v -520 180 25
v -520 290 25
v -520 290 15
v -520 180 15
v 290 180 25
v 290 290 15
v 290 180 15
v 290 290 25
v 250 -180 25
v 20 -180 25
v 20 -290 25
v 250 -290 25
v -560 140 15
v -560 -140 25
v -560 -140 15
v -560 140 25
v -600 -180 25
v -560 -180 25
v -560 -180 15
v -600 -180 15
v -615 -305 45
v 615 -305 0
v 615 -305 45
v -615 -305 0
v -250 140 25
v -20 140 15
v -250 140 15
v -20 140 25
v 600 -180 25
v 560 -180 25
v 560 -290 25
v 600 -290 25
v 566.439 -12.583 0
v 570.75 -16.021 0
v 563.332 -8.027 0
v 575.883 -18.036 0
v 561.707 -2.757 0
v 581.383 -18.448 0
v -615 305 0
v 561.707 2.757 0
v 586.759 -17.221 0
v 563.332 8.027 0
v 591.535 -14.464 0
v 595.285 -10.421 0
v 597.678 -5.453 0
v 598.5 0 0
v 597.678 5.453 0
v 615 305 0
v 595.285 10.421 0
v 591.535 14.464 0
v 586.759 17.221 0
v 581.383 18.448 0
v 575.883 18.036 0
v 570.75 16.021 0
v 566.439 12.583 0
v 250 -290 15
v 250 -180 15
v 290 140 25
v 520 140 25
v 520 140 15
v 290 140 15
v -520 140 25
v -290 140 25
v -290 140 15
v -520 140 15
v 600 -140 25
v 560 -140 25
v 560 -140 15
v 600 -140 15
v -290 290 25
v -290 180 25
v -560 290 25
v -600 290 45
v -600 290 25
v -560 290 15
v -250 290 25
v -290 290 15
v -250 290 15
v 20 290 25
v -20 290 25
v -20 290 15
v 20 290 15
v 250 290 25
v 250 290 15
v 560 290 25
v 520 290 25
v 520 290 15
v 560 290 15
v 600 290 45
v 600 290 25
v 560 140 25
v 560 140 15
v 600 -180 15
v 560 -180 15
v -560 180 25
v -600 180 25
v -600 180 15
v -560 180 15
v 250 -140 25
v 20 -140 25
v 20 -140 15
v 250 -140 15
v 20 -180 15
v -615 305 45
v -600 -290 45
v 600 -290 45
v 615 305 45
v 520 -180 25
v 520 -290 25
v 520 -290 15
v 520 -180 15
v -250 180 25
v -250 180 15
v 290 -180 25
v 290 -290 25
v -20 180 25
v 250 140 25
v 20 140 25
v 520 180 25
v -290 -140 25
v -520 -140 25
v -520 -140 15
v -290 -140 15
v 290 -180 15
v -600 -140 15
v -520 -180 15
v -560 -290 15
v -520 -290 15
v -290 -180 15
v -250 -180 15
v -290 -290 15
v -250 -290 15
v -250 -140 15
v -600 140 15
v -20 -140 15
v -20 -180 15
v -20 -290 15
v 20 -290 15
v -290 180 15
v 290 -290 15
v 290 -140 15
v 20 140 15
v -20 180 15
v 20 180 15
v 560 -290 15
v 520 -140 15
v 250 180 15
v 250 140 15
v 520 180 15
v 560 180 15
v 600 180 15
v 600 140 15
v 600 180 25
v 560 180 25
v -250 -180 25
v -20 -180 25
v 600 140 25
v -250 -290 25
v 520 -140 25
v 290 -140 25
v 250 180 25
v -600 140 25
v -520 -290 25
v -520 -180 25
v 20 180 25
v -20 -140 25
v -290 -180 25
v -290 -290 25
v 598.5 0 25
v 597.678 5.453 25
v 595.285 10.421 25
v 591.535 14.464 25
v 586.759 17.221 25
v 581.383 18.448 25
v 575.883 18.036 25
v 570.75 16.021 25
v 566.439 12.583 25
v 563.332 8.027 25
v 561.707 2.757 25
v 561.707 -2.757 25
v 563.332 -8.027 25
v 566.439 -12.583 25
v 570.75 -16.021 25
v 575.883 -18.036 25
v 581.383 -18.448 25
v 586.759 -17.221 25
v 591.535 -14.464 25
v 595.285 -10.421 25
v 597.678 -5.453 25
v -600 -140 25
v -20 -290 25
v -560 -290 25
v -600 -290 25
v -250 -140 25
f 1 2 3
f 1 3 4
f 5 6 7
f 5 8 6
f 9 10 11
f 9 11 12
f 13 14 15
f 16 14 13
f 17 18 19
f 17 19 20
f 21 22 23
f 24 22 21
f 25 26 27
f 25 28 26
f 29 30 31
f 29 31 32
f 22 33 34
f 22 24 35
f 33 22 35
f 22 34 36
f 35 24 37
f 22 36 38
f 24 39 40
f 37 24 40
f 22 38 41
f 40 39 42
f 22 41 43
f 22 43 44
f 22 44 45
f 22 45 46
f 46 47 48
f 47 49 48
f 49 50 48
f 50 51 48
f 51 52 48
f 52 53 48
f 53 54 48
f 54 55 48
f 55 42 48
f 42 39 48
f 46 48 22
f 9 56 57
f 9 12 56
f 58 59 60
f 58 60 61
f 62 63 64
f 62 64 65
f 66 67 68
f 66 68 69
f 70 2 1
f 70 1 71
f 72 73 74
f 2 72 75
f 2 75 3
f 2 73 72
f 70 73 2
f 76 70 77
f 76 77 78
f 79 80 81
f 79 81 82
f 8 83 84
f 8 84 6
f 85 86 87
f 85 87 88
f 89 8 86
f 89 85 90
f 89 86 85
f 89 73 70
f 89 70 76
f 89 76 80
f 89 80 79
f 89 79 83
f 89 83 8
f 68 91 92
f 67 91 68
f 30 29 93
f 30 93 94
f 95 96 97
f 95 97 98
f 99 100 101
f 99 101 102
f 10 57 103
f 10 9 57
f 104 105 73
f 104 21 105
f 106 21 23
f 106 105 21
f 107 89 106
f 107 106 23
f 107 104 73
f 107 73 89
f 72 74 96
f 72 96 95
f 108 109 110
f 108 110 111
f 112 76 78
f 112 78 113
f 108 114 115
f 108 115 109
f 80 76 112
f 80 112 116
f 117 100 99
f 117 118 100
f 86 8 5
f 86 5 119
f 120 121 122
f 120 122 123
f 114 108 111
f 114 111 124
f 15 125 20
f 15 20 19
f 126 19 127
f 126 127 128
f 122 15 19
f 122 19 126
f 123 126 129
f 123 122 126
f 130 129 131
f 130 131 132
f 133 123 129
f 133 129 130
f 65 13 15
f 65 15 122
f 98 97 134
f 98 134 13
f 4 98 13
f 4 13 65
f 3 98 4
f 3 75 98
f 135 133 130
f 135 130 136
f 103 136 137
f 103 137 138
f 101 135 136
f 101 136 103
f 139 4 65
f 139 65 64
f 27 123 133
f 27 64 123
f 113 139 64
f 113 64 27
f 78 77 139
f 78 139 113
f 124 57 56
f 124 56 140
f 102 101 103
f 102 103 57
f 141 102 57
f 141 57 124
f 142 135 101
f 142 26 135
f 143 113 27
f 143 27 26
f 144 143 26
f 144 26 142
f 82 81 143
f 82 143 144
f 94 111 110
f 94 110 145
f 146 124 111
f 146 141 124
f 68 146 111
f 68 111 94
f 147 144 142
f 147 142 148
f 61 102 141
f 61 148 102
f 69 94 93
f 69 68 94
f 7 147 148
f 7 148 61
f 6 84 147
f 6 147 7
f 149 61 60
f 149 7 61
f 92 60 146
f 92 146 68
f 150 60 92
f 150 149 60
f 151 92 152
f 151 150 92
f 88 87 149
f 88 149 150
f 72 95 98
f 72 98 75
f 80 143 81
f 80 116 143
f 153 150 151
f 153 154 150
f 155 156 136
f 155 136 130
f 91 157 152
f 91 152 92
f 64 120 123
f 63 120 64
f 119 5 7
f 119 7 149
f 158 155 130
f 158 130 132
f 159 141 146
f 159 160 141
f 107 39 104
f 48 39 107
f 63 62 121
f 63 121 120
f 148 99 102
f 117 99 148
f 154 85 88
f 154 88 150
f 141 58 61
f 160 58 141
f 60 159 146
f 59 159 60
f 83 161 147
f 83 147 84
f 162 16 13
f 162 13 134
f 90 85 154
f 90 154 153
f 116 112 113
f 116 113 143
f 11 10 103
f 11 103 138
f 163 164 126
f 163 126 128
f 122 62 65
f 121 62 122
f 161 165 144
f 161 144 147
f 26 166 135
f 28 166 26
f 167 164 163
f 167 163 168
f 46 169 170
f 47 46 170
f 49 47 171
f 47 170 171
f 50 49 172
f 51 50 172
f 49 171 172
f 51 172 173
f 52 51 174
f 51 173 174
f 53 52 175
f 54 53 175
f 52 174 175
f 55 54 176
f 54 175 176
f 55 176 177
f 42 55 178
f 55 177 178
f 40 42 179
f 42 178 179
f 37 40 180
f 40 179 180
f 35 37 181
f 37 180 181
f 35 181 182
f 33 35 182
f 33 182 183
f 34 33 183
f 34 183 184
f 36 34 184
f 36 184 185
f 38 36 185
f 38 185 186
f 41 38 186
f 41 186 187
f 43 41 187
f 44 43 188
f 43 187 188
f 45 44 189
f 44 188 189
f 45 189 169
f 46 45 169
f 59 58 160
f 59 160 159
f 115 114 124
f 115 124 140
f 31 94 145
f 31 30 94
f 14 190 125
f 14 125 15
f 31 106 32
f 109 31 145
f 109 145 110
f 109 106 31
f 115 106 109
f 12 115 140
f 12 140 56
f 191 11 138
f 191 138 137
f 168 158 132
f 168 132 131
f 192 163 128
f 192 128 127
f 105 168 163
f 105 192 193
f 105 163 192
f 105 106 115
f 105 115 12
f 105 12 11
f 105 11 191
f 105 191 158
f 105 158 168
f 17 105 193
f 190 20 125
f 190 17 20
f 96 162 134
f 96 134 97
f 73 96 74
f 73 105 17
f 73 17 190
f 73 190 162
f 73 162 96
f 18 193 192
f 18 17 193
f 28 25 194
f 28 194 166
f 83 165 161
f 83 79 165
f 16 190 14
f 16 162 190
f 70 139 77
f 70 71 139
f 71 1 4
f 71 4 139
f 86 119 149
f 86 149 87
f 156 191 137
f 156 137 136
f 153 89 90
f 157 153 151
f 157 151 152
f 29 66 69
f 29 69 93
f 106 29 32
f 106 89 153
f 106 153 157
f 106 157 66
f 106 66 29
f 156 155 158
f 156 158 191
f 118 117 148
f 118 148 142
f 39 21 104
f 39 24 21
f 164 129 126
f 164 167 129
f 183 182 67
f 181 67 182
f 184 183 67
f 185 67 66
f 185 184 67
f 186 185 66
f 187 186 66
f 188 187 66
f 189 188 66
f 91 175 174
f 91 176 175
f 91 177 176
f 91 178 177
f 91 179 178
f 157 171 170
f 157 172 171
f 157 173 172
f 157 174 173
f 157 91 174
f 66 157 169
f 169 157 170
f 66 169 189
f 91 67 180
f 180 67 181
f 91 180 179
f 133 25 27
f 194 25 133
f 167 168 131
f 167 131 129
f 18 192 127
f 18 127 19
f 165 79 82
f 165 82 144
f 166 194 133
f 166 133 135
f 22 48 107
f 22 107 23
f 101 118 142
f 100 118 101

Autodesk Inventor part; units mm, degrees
ref_plane "YZ Plane" through (0, 0, 0) normal (1, 0, 0) x (0, 1, 0)
ref_plane "XZ Plane" through (0, 0, 0) normal (0, 1, 0) x (-1, 0, 0)
ref_plane "XY Plane" through (0, 0, 0) normal (0, 0, 1) x (1, 0, 0)
sketch "Sketch1" plane through (0, 0, 0) normal (0, 0, 1) x (1, 0, 0)
  line L0 (-615, 305) -> (615, 305)
  line L1 (615, 305) -> (615, -305)
  line L2 (615, -305) -> (-615, -305)
  line L3 (-615, -305) -> (-615, 305)
  line L4 (-615, 305) -> (615, -305) construction
  line L5 (615, 305) -> (-615, -305) construction
  point P0 (0, 0)
  dimension "d0" = 610
  dimension "d1" = 1230
extrude "Extrusion1" add sketch "Sketch1" along normal blind 45
sketch "Sketch2" plane through (0, 0, 45) normal (0, 0, 1) x (1, 0, 0)
  line L0 (-600, 290) -> (600, 290)
  line L1 (600, 290) -> (600, -290)
  line L2 (600, -290) -> (-600, -290)
  line L3 (-600, -290) -> (-600, 290)
  line L4 (-600, 290) -> (600, -290) construction
  line L5 (600, 290) -> (-600, -290) construction
  point P0 (0, 0)
  dimension "d4" = 1200
  dimension "d5" = 580
extrude "Extrusion2" cut sketch "Sketch2" against normal blind 20
sketch "Sketch3" plane through (0, 0, 25) normal (0, 0, 1) x (1, 0, 0)
  line L0 (-20, 290) -> (20, 290)
  line L1 (20, 290) -> (20, -290)
  line L2 (20, -290) -> (-20, -290)
  line L3 (-20, -290) -> (-20, 290)
  line L4 (-20, 290) -> (20, -290) construction
  line L5 (20, 290) -> (-20, -290) construction
  line L6 (250, 290) -> (290, 290)
  line L7 (290, 290) -> (290, -290)
  line L8 (290, -290) -> (250, -290)
  line L9 (250, -290) -> (250, 290)
  line L10 (-290, 290) -> (-250, 290)
  line L11 (-250, 290) -> (-250, -290)
  line L12 (-250, -290) -> (-290, -290)
  line L13 (-290, -290) -> (-290, 290)
  line L14 (-600, 290) -> (600, 290) projected
  line L15 (520, 290) -> (560, 290)
  line L16 (560, 290) -> (560, -290)
  line L17 (560, -290) -> (520, -290)
  line L18 (520, -290) -> (520, 290)
  line L19 (-560, 290) -> (-520, 290)
  line L20 (-520, 290) -> (-520, -290)
  line L21 (-520, -290) -> (-560, -290)
  line L22 (-560, -290) -> (-560, 290)
  point P0 (0, 0)
  point P1 (250, 0)
  point P2 (-250, 0)
  point P3 (520, 0)
  point P4 (290, 0)
  point P5 (-290, 0)
  point P6 (-520, 0)
  dimension "d8" = 580
  dimension "d9" = 40
  dimension "d10" = 250
  dimension "d11" = 40
  dimension "d12" = 40
  dimension "d13" = 250
  dimension "d14" = 40
  dimension "d15" = 230
  dimension "d16" = 580
  dimension "d17" = 40
  dimension "d18" = 230
extrude "Extrusion3" cut sketch "Sketch3" against normal blind 10
sketch "Sketch4" plane through (0, 0, 25) normal (0, 0, 1) x (1, 0, 0)
  line L0 (600, 290) -> (600, -290) projected
  line L1 (-600, 180) -> (600, 180)
  line L2 (600, 180) -> (600, 140)
  line L3 (600, 140) -> (-600, 140)
  line L4 (-600, 140) -> (-600, 180)
  line L5 (-600, -140) -> (600, -140)
  line L6 (600, -140) -> (600, -180)
  line L7 (600, -180) -> (-600, -180)
  line L8 (-600, -180) -> (-600, -140)
  point P0 (0, 0)
  point P1 (0, 140)
  point P2 (0, -140)
  point P3 (600, -140)
  dimension "d21" = 140
  dimension "d22" = 140
  dimension "d23" = 40
  dimension "d24" = 40
  dimension "d25" = 1200
extrude "Extrusion4" cut sketch "Sketch4" against normal blind 10
sketch "Sketch5" plane through (0, 0, 25) normal (0, 0, 1) x (1, 0, 0)
  circle A0 centre (580, 0) radius 18.5
  point P0 (0, 0)
  dimension "d28" = 37
  dimension "d29" = 580
extrude "Extrusion5" cut sketch "Sketch5" against normal blind 37
equation "\"d30\" = d28"
properties part number "flood tray"
